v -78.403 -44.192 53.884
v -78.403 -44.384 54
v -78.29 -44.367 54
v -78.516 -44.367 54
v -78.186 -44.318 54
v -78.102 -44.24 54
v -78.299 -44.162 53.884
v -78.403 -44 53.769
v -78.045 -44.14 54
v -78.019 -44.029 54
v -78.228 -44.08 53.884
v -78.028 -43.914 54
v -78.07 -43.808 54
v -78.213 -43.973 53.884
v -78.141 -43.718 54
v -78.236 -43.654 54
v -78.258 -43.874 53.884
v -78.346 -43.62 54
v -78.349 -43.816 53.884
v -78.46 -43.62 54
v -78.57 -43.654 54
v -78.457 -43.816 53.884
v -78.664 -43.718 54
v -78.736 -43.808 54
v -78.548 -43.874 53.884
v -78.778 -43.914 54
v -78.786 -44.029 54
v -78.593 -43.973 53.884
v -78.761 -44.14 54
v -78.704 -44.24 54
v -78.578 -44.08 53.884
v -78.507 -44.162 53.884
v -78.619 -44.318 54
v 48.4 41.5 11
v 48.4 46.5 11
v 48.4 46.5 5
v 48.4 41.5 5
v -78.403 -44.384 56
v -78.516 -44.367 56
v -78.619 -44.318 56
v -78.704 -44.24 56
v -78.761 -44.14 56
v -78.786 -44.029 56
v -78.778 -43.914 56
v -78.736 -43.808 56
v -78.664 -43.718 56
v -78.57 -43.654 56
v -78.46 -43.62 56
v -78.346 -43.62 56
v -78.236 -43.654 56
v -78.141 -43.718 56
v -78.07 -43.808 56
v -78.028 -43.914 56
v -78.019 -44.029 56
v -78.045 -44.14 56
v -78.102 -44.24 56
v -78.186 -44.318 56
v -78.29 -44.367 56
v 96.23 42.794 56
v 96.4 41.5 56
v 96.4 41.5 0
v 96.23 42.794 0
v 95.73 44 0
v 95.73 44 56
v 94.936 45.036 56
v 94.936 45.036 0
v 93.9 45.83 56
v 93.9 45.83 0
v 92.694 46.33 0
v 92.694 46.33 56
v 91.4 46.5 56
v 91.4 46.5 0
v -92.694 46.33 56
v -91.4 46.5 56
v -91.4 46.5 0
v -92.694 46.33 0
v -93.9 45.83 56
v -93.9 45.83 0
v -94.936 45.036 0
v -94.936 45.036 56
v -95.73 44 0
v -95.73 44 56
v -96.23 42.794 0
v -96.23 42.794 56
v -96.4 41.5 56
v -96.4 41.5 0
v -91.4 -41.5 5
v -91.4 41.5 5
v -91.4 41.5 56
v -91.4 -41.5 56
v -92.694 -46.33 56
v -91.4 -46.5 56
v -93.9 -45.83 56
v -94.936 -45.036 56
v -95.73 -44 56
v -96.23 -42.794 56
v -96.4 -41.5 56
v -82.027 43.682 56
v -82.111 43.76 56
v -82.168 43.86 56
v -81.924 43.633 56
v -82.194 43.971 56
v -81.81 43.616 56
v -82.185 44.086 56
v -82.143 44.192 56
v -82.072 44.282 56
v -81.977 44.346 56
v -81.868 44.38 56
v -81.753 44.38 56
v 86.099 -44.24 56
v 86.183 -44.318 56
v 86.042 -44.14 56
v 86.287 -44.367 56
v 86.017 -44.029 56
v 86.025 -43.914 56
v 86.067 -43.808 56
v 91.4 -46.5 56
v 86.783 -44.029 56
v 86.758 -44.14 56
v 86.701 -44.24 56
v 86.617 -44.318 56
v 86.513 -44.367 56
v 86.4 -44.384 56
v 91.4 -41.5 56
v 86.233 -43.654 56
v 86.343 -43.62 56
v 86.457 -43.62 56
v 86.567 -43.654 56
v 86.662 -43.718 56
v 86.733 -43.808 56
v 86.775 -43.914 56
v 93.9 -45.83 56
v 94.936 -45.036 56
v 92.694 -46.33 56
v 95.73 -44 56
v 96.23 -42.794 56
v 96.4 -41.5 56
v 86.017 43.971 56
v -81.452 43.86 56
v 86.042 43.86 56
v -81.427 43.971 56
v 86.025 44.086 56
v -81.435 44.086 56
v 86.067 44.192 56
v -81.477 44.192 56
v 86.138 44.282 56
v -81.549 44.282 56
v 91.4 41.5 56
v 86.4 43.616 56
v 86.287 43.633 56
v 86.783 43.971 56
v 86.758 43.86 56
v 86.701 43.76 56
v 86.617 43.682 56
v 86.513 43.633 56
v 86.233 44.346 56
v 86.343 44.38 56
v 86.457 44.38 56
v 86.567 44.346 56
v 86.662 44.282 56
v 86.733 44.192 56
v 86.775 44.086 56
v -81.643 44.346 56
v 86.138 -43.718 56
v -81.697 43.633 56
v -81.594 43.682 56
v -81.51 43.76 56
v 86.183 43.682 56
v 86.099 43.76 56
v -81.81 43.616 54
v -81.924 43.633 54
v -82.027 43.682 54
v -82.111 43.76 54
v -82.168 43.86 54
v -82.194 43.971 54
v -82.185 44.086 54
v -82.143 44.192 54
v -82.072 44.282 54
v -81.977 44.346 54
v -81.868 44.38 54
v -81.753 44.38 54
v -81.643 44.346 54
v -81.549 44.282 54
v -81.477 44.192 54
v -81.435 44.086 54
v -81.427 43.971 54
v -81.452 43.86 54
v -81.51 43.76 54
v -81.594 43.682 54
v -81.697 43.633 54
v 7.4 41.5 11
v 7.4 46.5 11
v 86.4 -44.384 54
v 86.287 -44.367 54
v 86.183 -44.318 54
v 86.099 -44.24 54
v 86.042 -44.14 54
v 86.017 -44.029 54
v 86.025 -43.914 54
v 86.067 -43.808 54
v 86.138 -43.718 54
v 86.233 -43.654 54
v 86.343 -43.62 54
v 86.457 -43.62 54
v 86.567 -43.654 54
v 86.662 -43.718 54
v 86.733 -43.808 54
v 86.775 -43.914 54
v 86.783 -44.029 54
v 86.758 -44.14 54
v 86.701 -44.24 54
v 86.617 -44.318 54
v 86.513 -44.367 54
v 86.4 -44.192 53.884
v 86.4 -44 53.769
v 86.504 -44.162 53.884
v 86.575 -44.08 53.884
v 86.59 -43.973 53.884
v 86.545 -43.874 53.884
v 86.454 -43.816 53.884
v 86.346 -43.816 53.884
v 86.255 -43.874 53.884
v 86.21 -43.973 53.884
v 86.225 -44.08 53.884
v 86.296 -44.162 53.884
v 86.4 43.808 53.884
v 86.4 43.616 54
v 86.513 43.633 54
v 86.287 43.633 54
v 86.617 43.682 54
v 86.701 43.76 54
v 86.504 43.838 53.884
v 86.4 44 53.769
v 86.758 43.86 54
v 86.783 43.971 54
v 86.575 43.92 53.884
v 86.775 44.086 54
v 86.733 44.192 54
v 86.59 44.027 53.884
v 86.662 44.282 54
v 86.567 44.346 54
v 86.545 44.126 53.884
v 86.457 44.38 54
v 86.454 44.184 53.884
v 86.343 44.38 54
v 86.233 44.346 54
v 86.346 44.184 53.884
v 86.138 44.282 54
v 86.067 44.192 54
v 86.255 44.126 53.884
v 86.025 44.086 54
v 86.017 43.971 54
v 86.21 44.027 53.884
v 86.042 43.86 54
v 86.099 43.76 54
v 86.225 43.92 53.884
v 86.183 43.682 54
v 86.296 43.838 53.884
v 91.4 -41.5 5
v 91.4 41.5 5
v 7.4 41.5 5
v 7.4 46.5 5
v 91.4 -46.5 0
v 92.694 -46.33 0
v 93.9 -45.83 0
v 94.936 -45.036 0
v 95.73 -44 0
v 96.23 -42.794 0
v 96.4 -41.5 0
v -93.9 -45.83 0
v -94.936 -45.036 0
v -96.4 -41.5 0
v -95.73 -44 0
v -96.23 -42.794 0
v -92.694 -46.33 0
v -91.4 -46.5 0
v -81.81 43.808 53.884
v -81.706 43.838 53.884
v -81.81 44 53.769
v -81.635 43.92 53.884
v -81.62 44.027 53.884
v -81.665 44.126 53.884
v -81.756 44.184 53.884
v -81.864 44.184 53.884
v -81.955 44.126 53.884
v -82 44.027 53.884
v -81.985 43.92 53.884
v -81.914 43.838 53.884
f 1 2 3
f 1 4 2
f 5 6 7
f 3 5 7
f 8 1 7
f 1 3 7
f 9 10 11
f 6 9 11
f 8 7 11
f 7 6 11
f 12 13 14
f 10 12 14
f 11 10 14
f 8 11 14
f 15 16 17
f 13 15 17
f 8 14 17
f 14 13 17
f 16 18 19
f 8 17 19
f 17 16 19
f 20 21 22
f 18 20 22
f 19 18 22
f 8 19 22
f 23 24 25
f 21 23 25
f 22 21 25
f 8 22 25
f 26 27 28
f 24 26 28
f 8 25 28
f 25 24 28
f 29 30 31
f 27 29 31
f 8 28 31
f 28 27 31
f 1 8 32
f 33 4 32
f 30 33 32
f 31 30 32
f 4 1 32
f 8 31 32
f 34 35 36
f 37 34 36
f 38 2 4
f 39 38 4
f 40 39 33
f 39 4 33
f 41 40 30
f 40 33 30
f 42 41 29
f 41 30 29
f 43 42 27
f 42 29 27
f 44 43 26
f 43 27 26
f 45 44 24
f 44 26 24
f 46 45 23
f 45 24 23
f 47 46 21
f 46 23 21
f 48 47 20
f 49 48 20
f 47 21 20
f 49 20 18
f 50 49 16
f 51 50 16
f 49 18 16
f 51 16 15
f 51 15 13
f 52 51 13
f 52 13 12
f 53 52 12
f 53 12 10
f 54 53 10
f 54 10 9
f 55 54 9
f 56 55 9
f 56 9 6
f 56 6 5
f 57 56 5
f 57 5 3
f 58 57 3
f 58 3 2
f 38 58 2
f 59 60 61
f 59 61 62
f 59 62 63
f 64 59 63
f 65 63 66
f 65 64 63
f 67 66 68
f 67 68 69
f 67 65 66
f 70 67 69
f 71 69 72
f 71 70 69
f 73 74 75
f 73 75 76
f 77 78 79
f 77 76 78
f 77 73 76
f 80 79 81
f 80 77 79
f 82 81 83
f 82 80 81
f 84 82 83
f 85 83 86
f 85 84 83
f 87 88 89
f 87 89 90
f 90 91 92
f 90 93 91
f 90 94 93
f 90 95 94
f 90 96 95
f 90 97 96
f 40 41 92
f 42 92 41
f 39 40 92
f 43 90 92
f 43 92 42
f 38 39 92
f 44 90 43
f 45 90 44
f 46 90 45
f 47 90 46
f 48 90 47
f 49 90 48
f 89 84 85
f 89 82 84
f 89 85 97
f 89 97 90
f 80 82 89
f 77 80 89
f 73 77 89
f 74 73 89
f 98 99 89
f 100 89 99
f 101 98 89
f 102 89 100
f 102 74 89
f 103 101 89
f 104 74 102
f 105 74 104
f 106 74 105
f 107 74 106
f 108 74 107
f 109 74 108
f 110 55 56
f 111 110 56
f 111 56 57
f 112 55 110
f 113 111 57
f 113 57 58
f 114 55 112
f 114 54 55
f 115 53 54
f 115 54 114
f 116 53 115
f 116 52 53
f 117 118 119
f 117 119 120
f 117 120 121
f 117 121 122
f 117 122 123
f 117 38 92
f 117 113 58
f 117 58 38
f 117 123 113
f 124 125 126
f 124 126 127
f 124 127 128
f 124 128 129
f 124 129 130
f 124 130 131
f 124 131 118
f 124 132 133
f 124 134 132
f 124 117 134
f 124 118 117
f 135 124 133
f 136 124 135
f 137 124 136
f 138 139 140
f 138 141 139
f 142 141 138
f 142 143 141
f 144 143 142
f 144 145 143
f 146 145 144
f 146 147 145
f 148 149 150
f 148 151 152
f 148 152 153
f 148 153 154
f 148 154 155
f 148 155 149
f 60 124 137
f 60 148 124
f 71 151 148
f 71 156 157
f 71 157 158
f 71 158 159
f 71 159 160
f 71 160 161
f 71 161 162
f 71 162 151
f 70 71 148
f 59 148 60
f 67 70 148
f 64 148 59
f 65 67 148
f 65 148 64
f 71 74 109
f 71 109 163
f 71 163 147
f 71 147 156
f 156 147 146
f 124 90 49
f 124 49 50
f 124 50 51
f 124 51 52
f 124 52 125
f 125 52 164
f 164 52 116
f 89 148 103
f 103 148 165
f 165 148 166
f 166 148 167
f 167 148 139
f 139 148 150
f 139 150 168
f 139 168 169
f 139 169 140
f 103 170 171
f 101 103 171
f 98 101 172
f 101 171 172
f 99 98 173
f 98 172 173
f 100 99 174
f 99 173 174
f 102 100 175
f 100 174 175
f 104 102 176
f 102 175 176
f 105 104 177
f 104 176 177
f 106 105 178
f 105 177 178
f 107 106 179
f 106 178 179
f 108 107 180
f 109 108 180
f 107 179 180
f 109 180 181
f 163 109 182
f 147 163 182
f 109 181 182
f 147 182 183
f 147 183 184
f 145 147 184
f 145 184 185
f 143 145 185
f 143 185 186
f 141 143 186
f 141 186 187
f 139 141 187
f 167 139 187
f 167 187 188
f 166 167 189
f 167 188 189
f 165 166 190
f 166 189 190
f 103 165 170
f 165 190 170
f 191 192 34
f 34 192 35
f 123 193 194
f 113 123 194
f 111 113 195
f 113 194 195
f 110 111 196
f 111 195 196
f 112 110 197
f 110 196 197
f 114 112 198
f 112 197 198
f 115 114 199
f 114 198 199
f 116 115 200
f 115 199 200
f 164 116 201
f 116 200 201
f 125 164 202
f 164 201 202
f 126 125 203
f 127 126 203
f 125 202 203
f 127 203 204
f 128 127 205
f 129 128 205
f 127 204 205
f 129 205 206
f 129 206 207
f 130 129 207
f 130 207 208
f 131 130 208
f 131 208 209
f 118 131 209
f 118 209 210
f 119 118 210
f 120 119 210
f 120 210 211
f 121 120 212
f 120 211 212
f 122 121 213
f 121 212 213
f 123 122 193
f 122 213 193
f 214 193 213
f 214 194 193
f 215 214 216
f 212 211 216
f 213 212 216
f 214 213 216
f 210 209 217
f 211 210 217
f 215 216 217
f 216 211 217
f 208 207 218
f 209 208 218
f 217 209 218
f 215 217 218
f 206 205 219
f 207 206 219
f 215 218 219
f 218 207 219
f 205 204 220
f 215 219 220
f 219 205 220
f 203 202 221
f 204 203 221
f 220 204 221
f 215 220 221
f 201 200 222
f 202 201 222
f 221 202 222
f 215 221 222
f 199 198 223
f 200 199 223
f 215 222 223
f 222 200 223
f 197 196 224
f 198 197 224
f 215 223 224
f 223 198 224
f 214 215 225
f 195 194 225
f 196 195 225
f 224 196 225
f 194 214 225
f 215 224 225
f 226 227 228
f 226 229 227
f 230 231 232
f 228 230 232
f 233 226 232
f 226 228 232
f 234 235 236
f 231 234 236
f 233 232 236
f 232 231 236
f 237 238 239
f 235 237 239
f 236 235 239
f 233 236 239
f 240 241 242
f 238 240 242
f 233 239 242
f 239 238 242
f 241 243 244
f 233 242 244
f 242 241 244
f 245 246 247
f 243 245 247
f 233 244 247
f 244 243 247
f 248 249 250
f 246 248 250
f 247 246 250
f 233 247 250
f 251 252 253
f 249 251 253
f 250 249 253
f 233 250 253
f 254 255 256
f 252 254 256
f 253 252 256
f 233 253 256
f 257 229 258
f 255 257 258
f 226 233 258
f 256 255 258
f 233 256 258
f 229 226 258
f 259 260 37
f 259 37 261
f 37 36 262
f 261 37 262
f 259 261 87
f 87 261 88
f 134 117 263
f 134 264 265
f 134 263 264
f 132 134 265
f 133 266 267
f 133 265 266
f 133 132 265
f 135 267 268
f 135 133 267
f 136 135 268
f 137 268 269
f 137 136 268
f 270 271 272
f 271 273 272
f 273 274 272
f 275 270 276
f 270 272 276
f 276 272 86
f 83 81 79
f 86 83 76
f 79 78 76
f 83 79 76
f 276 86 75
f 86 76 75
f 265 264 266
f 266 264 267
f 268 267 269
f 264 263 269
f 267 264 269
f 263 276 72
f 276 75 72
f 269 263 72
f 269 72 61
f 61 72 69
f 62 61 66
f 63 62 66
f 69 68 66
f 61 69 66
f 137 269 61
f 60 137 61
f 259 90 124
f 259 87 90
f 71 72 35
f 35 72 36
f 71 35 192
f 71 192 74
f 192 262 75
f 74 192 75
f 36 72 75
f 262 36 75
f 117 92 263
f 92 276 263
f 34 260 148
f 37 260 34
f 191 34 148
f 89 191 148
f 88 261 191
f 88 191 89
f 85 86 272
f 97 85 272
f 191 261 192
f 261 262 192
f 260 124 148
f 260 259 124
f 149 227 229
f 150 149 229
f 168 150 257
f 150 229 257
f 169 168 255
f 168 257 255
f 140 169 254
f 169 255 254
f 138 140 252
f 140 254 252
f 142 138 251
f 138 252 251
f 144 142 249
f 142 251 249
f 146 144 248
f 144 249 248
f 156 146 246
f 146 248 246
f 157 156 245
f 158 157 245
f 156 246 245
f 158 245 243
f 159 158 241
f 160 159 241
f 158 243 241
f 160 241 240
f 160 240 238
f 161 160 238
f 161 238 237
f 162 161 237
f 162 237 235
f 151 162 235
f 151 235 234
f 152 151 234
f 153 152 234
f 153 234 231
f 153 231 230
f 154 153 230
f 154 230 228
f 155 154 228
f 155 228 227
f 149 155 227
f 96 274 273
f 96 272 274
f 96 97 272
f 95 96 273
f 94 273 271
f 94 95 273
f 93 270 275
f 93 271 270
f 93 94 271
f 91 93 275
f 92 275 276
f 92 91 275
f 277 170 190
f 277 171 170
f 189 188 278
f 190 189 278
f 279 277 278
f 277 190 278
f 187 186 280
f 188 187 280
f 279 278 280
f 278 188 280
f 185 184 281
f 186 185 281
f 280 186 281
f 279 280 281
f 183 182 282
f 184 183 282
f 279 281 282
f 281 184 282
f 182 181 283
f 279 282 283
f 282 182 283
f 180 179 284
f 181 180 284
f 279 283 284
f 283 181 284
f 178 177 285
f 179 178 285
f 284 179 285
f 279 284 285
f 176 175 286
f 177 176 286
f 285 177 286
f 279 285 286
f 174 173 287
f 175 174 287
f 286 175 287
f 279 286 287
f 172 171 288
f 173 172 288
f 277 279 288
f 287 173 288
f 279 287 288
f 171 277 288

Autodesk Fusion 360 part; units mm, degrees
sketch "Boceto1" plane through (0, 0, 0) normal (0, 0, 1) x (1, 0, 0)
  line L0 (96.4, 46.5) -> (-96.4, 46.5)
  line L1 (-96.4, 46.5) -> (-96.4, -46.5)
  line L2 (-96.4, -46.5) -> (96.4, -46.5)
  line L3 (96.4, -46.5) -> (96.4, 46.5)
  line L4 (96.4, 46.5) -> (-96.4, -46.5) construction
  line L5 (-96.4, 46.5) -> (96.4, -46.5) construction
  dimension "d1" = 192.8
  dimension "d2" = 93
extrude "Extruir1" add sketch "Boceto1" along normal blind 56
shell "Vaciado1" thickness 5 removed faces 1 at (-32.1333, 15.5, 56)
fillet "Empalme1" radius 5 1 edges at (96.4, 46.5, 28)
fillet "Empalme2" radius 5 1 edges at (96.4, -46.5, 28)
fillet "Empalme3" radius 5 1 edges at (-96.4, -46.5, 28)
fillet "Empalme4" radius 5 1 edges at (-96.4, 46.5, 28)
sketch "Boceto3" plane through (0, 46.5, 0) normal (0, 1, 0) x (-1, 0, 0)
  line L0 (91.4, 0) -> (91.4, 56)
  line L1 (91.4, 56) -> (-91.4, 56)
  line L2 (-91.4, 56) -> (-91.4, 0)
  line L3 (-91.4, 0) -> (91.4, 0)
  line L4 (-91.4, 0) -> (-91.4, 5)
  line L5 (-91.4, 5) -> (-48.4, 5)
  line L6 (-48.4, 5) -> (-7.4, 5)
  line L7 (-7.4, 5) -> (-7.4, 11)
  line L8 (-7.4, 11) -> (-48.4, 11)
  line L9 (-48.4, 11) -> (-48.4, 5)
  dimension "d17" = 5
  dimension "d18" = 43
  dimension "d19" = 41
  dimension "d20" = 6
  dimension "d21" = 41
extrude "Extruir2" cut sketch "Boceto3" against normal blind 5 contours L6 L7 L8 L9
sketch "Boceto4" plane through (0, 0, 56) normal (0, 0, 1) x (-1, 0, 0)
  arc A0 (91.4, -46.5) -> (96.4, -41.5) centre (91.4, -41.5) ccw
  line L0 (96.4, -41.5) -> (96.4, 41.5)
  arc A1 (96.4, 41.5) -> (91.4, 46.5) centre (91.4, 41.5) ccw
  line L1 (91.4, 46.5) -> (-91.4, 46.5)
  arc A2 (-91.4, 46.5) -> (-96.4, 41.5) centre (-91.4, 41.5) ccw
  line L2 (-96.4, 41.5) -> (-96.4, -41.5)
  arc A3 (-96.4, -41.5) -> (-91.4, -46.5) centre (-91.4, -41.5) ccw
  line L3 (-91.4, -46.5) -> (91.4, -46.5)
  line L4 (-91.4, 41.5) -> (91.4, 41.5)
  line L5 (91.4, 41.5) -> (91.4, -41.5)
  line L6 (91.4, -41.5) -> (-91.4, -41.5)
  line L7 (-91.4, -41.5) -> (-91.4, 41.5)
  line L8 (-96.4, -46.5) -> (-86.4, -46.5)
  line L9 (-86.4, -46.5) -> (-86.4, -44)
  dimension "d24" = 10
  dimension "d25" = 2.5
sketch "Boceto5" plane through (0, 0, 0) normal (0, 0, 1) x (1, 0, 0)
sketch "Boceto6" plane through (0, 0, 56) normal (0, 0, 1) x (-1, 0, 0)
sketch "Boceto7" plane through (0, 0, 56) normal (0, 0, 1) x (-1, 0, 0)
hole "Agujero1" at (86.4, 44, 56) direction (0, 0, -1) diameter 0.769 depth 2 tip angle 118
sketch "Boceto8" plane through (0, 0, 0) normal (0, 0, 1) x (1, 0, 0)
sketch "Boceto9" plane through (0, 0, 56) normal (0, 0, 1) x (-1, 0, 0)
  circle A0 centre (-86.4, -44) radius 0.3847
  arc A1 (91.4, -46.5) -> (96.4, -41.5) centre (91.4, -41.5) ccw
  line L0 (96.4, -41.5) -> (96.4, 41.5)
  arc A2 (96.4, 41.5) -> (91.4, 46.5) centre (91.4, 41.5) ccw
  line L1 (91.4, 46.5) -> (-91.4, 46.5)
  arc A3 (-91.4, 46.5) -> (-96.4, 41.5) centre (-91.4, 41.5) ccw
  line L2 (-96.4, 41.5) -> (-96.4, -41.5)
  arc A4 (-96.4, -41.5) -> (-91.4, -46.5) centre (-91.4, -41.5) ccw
  line L3 (-91.4, -46.5) -> (91.4, -46.5)
  line L4 (-91.4, 41.5) -> (91.4, 41.5)
  line L5 (91.4, 41.5) -> (91.4, -41.5)
  line L6 (91.4, -41.5) -> (-91.4, -41.5)
  line L7 (-91.4, -41.5) -> (-91.4, 41.5)
  line L8 (81.8102, -46.5) -> (81.8102, -44)
  dimension "d31" = 2.5
hole "Agujero2" at (-81.8102, 44, 56) direction (0, 0, -1) diameter 0.769 depth 2 tip angle 118
sketch "Boceto10" plane through (0, 0, 56) normal (0, 0, 1) x (-1, 0, 0)
  circle A0 centre (81.8102, -44) radius 0.3847
  circle A1 centre (-86.4, -44) radius 0.3847
  arc A2 (91.4, -46.5) -> (96.4, -41.5) centre (91.4, -41.5) ccw
  line L0 (96.4, -41.5) -> (96.4, 41.5)
  arc A3 (96.4, 41.5) -> (91.4, 46.5) centre (91.4, 41.5) ccw
  line L1 (91.4, 46.5) -> (-91.4, 46.5)
  arc A4 (-91.4, 46.5) -> (-96.4, 41.5) centre (-91.4, 41.5) ccw
  line L2 (-96.4, 41.5) -> (-96.4, -41.5)
  arc A5 (-96.4, -41.5) -> (-91.4, -46.5) centre (-91.4, -41.5) ccw
  line L3 (-91.4, -46.5) -> (91.4, -46.5)
  line L4 (-91.4, 41.5) -> (91.4, 41.5)
  line L5 (91.4, 41.5) -> (91.4, -41.5)
  line L6 (91.4, -41.5) -> (-91.4, -41.5)
  line L7 (-91.4, -41.5) -> (-91.4, 41.5)
  line L8 (78.4029, 46.5) -> (78.4029, 44)
  line L9 (-85.7578, 46.5) -> (-85.7578, 44)
  dimension "d37" = 2.5
  dimension "d38" = 2.5
hole "Agujero3" at (-78.4029, -44, 56) direction (0, 0, -1) diameter 0.769 depth 2 tip angle 118
sketch "Boceto11" plane through (0, 0, 56) normal (0, 0, 1) x (-1, 0, 0)
  circle A0 centre (78.4029, 44) radius 0.3847
  circle A1 centre (81.8102, -44) radius 0.3847
  circle A2 centre (-86.4, -44) radius 0.3847
  arc A3 (91.4, -46.5) -> (96.4, -41.5) centre (91.4, -41.5) ccw
  line L0 (96.4, -41.5) -> (96.4, 41.5)
  arc A4 (96.4, 41.5) -> (91.4, 46.5) centre (91.4, 41.5) ccw
  line L1 (91.4, 46.5) -> (-91.4, 46.5)
  arc A5 (-91.4, 46.5) -> (-96.4, 41.5) centre (-91.4, 41.5) ccw
  line L2 (-96.4, 41.5) -> (-96.4, -41.5)
  arc A6 (-96.4, -41.5) -> (-91.4, -46.5) centre (-91.4, -41.5) ccw
  line L3 (-91.4, -46.5) -> (91.4, -46.5)
  line L4 (-91.4, 41.5) -> (91.4, 41.5)
  line L5 (91.4, 41.5) -> (91.4, -41.5)
  line L6 (91.4, -41.5) -> (-91.4, -41.5)
  line L7 (-91.4, -41.5) -> (-91.4, 41.5)
  line L8 (-86.4, 46.5) -> (-86.4, 44)
  dimension "d44" = 2.5
hole "Agujero4" at (86.4, -44, 56) direction (0, 0, -1) diameter 0.769 depth 2 tip angle 118
